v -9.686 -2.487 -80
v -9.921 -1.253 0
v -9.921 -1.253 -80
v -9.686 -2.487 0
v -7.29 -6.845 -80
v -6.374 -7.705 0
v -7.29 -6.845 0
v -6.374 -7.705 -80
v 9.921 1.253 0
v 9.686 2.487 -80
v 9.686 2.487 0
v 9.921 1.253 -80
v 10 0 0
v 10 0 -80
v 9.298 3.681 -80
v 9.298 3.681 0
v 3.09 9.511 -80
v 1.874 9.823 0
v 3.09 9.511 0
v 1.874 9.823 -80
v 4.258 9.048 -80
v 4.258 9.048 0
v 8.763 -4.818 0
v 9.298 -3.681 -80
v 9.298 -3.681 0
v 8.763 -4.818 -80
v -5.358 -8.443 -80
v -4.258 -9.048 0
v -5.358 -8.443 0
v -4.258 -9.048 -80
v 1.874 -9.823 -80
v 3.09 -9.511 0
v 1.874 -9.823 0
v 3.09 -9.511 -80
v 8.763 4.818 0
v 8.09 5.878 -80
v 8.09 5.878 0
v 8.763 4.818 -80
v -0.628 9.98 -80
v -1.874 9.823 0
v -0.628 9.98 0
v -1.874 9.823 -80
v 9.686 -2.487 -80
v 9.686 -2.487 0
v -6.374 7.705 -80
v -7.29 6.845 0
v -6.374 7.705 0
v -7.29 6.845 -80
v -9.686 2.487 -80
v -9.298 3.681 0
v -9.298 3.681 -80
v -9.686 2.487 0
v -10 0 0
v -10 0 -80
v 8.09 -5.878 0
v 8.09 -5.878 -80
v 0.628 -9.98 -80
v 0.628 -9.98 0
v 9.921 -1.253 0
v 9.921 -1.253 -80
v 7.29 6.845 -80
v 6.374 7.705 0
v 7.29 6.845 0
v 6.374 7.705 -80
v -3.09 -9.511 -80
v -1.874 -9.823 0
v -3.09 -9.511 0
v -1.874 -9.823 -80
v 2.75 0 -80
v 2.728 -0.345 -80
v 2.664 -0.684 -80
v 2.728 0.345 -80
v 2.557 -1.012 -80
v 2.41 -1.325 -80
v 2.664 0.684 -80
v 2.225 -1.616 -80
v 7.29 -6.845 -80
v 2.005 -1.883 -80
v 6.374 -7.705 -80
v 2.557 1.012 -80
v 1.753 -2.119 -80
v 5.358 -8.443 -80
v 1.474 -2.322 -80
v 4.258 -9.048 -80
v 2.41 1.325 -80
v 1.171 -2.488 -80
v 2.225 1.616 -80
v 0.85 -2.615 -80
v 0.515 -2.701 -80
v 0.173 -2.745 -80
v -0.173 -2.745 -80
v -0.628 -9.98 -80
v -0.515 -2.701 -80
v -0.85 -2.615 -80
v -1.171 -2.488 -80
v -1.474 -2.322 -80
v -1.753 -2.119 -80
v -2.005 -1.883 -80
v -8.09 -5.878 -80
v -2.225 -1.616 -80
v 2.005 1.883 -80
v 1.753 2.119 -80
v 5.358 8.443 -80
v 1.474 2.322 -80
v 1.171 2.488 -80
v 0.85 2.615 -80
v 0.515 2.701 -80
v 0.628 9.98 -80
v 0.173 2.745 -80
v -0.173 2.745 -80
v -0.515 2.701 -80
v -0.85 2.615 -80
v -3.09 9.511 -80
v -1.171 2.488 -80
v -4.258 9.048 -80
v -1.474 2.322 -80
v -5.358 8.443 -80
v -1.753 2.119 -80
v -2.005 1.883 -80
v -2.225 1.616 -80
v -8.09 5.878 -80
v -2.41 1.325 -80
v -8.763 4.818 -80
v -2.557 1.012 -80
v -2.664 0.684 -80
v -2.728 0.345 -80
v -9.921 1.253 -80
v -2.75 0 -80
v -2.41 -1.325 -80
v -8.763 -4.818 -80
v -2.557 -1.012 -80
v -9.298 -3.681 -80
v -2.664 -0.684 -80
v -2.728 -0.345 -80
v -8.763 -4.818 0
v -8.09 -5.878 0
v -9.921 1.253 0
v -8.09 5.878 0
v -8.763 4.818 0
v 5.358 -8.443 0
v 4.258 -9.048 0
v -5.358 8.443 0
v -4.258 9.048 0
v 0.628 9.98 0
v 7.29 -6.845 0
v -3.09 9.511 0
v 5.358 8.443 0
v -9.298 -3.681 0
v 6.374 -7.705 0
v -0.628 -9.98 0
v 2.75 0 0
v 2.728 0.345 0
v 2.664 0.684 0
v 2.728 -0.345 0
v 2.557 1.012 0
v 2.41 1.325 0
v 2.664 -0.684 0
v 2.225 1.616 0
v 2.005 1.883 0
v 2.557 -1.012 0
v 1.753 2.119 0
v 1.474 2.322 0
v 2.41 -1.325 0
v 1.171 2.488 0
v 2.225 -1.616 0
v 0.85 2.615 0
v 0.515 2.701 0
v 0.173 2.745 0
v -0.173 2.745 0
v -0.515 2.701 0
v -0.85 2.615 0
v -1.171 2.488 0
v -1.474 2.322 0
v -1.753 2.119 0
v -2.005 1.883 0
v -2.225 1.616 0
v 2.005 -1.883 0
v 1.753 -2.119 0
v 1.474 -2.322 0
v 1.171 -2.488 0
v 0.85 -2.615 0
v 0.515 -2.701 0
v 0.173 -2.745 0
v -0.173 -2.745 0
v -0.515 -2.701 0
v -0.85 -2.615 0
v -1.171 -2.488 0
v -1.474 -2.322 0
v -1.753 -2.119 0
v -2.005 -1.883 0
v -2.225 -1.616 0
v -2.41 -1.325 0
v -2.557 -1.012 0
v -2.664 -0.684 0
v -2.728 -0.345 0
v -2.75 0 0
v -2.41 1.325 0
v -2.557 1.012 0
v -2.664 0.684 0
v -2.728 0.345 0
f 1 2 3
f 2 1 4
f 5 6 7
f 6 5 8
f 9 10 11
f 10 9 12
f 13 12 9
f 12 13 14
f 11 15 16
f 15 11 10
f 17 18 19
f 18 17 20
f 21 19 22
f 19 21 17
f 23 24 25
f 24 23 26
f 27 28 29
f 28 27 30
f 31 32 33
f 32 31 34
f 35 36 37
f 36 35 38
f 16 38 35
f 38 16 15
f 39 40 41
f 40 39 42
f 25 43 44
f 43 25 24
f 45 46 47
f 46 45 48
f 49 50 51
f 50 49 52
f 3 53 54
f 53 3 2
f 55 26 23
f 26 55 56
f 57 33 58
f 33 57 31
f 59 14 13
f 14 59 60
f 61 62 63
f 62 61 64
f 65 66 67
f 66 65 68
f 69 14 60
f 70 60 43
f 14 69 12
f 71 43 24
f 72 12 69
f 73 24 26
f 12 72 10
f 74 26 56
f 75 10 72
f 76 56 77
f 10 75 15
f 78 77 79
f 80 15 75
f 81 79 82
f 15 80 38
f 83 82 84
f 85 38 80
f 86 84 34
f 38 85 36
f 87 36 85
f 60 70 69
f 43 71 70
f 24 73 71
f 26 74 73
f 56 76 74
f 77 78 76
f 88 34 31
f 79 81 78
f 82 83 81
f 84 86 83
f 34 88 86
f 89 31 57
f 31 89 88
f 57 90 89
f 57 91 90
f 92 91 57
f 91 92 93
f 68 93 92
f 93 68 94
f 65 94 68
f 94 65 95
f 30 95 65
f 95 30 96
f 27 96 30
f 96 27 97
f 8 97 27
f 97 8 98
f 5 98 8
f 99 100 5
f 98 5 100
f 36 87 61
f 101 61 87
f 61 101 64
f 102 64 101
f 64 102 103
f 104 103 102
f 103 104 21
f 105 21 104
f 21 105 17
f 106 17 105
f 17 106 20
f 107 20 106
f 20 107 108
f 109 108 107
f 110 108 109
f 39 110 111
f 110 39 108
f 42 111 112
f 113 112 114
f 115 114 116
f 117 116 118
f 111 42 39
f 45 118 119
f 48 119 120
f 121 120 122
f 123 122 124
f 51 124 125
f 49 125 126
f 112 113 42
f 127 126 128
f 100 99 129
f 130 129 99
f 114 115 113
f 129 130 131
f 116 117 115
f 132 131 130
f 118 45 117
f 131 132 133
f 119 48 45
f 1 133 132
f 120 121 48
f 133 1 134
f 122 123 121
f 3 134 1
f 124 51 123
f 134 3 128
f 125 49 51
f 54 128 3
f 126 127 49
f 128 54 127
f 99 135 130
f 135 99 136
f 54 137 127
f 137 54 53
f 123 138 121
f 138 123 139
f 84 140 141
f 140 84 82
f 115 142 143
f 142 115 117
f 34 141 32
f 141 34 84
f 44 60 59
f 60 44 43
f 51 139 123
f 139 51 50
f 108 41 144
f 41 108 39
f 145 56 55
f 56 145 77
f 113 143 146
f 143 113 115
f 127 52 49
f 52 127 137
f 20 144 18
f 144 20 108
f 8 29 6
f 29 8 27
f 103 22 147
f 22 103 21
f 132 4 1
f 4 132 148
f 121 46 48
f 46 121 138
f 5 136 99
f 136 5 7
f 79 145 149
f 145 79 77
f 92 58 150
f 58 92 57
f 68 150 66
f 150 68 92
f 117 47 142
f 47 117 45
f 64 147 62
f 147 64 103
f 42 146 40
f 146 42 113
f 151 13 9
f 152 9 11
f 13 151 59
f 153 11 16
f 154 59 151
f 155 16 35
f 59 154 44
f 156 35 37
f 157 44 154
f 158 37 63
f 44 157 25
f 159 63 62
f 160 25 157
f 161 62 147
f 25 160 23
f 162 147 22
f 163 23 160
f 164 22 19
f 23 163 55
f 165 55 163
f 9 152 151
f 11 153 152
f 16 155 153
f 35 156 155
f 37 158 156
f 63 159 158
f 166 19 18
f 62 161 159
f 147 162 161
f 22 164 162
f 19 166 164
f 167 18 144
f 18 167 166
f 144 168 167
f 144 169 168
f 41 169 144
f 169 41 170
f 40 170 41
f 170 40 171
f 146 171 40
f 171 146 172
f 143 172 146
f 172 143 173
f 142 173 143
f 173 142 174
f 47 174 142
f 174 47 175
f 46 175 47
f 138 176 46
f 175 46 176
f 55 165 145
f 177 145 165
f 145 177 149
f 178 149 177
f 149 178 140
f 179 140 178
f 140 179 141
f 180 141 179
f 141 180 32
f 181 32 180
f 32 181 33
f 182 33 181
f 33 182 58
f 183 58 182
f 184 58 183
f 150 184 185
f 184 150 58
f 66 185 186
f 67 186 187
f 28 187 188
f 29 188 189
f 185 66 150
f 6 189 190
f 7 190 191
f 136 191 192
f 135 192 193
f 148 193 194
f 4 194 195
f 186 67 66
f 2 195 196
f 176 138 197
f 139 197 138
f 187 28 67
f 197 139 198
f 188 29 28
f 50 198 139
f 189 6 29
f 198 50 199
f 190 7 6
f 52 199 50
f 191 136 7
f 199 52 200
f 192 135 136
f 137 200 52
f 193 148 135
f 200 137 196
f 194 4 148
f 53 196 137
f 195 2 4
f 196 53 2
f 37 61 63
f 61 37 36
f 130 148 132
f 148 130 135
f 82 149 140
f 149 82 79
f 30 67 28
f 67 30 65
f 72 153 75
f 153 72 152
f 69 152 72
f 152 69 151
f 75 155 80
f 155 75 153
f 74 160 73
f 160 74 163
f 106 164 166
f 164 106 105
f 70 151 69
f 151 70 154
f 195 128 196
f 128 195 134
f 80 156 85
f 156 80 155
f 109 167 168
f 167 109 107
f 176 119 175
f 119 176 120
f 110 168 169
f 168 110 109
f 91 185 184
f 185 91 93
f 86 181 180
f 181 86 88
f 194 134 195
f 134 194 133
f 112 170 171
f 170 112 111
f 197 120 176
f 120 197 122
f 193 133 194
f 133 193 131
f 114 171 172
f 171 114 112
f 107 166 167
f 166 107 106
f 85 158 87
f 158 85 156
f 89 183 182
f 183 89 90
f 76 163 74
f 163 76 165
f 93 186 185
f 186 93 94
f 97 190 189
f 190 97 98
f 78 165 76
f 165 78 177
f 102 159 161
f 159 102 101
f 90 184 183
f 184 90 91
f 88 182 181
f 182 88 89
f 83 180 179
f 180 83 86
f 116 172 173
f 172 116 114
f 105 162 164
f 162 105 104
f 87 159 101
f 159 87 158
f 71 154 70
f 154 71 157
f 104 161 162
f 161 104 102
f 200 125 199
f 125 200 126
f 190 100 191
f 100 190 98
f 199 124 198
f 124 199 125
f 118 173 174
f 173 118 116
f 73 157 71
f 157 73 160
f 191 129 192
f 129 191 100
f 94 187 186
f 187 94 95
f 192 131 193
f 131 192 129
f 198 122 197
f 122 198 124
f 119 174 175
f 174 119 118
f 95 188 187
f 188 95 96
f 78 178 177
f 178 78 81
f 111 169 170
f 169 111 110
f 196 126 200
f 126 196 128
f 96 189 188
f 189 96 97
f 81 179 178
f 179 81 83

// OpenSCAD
$fn = 50;


difference() {
	union() {
		translate(v = [0, 0, -80.0000000000]) {
			cylinder(h = 80, r = 10.0000000000);
		}
		cylinder(h = 0, r = 20.0000000000);
	}
	union() {
		#translate(v = [0, 0, -80]) {
			cylinder(h = 80, r = 2.7500000000);
		}
	}
}
